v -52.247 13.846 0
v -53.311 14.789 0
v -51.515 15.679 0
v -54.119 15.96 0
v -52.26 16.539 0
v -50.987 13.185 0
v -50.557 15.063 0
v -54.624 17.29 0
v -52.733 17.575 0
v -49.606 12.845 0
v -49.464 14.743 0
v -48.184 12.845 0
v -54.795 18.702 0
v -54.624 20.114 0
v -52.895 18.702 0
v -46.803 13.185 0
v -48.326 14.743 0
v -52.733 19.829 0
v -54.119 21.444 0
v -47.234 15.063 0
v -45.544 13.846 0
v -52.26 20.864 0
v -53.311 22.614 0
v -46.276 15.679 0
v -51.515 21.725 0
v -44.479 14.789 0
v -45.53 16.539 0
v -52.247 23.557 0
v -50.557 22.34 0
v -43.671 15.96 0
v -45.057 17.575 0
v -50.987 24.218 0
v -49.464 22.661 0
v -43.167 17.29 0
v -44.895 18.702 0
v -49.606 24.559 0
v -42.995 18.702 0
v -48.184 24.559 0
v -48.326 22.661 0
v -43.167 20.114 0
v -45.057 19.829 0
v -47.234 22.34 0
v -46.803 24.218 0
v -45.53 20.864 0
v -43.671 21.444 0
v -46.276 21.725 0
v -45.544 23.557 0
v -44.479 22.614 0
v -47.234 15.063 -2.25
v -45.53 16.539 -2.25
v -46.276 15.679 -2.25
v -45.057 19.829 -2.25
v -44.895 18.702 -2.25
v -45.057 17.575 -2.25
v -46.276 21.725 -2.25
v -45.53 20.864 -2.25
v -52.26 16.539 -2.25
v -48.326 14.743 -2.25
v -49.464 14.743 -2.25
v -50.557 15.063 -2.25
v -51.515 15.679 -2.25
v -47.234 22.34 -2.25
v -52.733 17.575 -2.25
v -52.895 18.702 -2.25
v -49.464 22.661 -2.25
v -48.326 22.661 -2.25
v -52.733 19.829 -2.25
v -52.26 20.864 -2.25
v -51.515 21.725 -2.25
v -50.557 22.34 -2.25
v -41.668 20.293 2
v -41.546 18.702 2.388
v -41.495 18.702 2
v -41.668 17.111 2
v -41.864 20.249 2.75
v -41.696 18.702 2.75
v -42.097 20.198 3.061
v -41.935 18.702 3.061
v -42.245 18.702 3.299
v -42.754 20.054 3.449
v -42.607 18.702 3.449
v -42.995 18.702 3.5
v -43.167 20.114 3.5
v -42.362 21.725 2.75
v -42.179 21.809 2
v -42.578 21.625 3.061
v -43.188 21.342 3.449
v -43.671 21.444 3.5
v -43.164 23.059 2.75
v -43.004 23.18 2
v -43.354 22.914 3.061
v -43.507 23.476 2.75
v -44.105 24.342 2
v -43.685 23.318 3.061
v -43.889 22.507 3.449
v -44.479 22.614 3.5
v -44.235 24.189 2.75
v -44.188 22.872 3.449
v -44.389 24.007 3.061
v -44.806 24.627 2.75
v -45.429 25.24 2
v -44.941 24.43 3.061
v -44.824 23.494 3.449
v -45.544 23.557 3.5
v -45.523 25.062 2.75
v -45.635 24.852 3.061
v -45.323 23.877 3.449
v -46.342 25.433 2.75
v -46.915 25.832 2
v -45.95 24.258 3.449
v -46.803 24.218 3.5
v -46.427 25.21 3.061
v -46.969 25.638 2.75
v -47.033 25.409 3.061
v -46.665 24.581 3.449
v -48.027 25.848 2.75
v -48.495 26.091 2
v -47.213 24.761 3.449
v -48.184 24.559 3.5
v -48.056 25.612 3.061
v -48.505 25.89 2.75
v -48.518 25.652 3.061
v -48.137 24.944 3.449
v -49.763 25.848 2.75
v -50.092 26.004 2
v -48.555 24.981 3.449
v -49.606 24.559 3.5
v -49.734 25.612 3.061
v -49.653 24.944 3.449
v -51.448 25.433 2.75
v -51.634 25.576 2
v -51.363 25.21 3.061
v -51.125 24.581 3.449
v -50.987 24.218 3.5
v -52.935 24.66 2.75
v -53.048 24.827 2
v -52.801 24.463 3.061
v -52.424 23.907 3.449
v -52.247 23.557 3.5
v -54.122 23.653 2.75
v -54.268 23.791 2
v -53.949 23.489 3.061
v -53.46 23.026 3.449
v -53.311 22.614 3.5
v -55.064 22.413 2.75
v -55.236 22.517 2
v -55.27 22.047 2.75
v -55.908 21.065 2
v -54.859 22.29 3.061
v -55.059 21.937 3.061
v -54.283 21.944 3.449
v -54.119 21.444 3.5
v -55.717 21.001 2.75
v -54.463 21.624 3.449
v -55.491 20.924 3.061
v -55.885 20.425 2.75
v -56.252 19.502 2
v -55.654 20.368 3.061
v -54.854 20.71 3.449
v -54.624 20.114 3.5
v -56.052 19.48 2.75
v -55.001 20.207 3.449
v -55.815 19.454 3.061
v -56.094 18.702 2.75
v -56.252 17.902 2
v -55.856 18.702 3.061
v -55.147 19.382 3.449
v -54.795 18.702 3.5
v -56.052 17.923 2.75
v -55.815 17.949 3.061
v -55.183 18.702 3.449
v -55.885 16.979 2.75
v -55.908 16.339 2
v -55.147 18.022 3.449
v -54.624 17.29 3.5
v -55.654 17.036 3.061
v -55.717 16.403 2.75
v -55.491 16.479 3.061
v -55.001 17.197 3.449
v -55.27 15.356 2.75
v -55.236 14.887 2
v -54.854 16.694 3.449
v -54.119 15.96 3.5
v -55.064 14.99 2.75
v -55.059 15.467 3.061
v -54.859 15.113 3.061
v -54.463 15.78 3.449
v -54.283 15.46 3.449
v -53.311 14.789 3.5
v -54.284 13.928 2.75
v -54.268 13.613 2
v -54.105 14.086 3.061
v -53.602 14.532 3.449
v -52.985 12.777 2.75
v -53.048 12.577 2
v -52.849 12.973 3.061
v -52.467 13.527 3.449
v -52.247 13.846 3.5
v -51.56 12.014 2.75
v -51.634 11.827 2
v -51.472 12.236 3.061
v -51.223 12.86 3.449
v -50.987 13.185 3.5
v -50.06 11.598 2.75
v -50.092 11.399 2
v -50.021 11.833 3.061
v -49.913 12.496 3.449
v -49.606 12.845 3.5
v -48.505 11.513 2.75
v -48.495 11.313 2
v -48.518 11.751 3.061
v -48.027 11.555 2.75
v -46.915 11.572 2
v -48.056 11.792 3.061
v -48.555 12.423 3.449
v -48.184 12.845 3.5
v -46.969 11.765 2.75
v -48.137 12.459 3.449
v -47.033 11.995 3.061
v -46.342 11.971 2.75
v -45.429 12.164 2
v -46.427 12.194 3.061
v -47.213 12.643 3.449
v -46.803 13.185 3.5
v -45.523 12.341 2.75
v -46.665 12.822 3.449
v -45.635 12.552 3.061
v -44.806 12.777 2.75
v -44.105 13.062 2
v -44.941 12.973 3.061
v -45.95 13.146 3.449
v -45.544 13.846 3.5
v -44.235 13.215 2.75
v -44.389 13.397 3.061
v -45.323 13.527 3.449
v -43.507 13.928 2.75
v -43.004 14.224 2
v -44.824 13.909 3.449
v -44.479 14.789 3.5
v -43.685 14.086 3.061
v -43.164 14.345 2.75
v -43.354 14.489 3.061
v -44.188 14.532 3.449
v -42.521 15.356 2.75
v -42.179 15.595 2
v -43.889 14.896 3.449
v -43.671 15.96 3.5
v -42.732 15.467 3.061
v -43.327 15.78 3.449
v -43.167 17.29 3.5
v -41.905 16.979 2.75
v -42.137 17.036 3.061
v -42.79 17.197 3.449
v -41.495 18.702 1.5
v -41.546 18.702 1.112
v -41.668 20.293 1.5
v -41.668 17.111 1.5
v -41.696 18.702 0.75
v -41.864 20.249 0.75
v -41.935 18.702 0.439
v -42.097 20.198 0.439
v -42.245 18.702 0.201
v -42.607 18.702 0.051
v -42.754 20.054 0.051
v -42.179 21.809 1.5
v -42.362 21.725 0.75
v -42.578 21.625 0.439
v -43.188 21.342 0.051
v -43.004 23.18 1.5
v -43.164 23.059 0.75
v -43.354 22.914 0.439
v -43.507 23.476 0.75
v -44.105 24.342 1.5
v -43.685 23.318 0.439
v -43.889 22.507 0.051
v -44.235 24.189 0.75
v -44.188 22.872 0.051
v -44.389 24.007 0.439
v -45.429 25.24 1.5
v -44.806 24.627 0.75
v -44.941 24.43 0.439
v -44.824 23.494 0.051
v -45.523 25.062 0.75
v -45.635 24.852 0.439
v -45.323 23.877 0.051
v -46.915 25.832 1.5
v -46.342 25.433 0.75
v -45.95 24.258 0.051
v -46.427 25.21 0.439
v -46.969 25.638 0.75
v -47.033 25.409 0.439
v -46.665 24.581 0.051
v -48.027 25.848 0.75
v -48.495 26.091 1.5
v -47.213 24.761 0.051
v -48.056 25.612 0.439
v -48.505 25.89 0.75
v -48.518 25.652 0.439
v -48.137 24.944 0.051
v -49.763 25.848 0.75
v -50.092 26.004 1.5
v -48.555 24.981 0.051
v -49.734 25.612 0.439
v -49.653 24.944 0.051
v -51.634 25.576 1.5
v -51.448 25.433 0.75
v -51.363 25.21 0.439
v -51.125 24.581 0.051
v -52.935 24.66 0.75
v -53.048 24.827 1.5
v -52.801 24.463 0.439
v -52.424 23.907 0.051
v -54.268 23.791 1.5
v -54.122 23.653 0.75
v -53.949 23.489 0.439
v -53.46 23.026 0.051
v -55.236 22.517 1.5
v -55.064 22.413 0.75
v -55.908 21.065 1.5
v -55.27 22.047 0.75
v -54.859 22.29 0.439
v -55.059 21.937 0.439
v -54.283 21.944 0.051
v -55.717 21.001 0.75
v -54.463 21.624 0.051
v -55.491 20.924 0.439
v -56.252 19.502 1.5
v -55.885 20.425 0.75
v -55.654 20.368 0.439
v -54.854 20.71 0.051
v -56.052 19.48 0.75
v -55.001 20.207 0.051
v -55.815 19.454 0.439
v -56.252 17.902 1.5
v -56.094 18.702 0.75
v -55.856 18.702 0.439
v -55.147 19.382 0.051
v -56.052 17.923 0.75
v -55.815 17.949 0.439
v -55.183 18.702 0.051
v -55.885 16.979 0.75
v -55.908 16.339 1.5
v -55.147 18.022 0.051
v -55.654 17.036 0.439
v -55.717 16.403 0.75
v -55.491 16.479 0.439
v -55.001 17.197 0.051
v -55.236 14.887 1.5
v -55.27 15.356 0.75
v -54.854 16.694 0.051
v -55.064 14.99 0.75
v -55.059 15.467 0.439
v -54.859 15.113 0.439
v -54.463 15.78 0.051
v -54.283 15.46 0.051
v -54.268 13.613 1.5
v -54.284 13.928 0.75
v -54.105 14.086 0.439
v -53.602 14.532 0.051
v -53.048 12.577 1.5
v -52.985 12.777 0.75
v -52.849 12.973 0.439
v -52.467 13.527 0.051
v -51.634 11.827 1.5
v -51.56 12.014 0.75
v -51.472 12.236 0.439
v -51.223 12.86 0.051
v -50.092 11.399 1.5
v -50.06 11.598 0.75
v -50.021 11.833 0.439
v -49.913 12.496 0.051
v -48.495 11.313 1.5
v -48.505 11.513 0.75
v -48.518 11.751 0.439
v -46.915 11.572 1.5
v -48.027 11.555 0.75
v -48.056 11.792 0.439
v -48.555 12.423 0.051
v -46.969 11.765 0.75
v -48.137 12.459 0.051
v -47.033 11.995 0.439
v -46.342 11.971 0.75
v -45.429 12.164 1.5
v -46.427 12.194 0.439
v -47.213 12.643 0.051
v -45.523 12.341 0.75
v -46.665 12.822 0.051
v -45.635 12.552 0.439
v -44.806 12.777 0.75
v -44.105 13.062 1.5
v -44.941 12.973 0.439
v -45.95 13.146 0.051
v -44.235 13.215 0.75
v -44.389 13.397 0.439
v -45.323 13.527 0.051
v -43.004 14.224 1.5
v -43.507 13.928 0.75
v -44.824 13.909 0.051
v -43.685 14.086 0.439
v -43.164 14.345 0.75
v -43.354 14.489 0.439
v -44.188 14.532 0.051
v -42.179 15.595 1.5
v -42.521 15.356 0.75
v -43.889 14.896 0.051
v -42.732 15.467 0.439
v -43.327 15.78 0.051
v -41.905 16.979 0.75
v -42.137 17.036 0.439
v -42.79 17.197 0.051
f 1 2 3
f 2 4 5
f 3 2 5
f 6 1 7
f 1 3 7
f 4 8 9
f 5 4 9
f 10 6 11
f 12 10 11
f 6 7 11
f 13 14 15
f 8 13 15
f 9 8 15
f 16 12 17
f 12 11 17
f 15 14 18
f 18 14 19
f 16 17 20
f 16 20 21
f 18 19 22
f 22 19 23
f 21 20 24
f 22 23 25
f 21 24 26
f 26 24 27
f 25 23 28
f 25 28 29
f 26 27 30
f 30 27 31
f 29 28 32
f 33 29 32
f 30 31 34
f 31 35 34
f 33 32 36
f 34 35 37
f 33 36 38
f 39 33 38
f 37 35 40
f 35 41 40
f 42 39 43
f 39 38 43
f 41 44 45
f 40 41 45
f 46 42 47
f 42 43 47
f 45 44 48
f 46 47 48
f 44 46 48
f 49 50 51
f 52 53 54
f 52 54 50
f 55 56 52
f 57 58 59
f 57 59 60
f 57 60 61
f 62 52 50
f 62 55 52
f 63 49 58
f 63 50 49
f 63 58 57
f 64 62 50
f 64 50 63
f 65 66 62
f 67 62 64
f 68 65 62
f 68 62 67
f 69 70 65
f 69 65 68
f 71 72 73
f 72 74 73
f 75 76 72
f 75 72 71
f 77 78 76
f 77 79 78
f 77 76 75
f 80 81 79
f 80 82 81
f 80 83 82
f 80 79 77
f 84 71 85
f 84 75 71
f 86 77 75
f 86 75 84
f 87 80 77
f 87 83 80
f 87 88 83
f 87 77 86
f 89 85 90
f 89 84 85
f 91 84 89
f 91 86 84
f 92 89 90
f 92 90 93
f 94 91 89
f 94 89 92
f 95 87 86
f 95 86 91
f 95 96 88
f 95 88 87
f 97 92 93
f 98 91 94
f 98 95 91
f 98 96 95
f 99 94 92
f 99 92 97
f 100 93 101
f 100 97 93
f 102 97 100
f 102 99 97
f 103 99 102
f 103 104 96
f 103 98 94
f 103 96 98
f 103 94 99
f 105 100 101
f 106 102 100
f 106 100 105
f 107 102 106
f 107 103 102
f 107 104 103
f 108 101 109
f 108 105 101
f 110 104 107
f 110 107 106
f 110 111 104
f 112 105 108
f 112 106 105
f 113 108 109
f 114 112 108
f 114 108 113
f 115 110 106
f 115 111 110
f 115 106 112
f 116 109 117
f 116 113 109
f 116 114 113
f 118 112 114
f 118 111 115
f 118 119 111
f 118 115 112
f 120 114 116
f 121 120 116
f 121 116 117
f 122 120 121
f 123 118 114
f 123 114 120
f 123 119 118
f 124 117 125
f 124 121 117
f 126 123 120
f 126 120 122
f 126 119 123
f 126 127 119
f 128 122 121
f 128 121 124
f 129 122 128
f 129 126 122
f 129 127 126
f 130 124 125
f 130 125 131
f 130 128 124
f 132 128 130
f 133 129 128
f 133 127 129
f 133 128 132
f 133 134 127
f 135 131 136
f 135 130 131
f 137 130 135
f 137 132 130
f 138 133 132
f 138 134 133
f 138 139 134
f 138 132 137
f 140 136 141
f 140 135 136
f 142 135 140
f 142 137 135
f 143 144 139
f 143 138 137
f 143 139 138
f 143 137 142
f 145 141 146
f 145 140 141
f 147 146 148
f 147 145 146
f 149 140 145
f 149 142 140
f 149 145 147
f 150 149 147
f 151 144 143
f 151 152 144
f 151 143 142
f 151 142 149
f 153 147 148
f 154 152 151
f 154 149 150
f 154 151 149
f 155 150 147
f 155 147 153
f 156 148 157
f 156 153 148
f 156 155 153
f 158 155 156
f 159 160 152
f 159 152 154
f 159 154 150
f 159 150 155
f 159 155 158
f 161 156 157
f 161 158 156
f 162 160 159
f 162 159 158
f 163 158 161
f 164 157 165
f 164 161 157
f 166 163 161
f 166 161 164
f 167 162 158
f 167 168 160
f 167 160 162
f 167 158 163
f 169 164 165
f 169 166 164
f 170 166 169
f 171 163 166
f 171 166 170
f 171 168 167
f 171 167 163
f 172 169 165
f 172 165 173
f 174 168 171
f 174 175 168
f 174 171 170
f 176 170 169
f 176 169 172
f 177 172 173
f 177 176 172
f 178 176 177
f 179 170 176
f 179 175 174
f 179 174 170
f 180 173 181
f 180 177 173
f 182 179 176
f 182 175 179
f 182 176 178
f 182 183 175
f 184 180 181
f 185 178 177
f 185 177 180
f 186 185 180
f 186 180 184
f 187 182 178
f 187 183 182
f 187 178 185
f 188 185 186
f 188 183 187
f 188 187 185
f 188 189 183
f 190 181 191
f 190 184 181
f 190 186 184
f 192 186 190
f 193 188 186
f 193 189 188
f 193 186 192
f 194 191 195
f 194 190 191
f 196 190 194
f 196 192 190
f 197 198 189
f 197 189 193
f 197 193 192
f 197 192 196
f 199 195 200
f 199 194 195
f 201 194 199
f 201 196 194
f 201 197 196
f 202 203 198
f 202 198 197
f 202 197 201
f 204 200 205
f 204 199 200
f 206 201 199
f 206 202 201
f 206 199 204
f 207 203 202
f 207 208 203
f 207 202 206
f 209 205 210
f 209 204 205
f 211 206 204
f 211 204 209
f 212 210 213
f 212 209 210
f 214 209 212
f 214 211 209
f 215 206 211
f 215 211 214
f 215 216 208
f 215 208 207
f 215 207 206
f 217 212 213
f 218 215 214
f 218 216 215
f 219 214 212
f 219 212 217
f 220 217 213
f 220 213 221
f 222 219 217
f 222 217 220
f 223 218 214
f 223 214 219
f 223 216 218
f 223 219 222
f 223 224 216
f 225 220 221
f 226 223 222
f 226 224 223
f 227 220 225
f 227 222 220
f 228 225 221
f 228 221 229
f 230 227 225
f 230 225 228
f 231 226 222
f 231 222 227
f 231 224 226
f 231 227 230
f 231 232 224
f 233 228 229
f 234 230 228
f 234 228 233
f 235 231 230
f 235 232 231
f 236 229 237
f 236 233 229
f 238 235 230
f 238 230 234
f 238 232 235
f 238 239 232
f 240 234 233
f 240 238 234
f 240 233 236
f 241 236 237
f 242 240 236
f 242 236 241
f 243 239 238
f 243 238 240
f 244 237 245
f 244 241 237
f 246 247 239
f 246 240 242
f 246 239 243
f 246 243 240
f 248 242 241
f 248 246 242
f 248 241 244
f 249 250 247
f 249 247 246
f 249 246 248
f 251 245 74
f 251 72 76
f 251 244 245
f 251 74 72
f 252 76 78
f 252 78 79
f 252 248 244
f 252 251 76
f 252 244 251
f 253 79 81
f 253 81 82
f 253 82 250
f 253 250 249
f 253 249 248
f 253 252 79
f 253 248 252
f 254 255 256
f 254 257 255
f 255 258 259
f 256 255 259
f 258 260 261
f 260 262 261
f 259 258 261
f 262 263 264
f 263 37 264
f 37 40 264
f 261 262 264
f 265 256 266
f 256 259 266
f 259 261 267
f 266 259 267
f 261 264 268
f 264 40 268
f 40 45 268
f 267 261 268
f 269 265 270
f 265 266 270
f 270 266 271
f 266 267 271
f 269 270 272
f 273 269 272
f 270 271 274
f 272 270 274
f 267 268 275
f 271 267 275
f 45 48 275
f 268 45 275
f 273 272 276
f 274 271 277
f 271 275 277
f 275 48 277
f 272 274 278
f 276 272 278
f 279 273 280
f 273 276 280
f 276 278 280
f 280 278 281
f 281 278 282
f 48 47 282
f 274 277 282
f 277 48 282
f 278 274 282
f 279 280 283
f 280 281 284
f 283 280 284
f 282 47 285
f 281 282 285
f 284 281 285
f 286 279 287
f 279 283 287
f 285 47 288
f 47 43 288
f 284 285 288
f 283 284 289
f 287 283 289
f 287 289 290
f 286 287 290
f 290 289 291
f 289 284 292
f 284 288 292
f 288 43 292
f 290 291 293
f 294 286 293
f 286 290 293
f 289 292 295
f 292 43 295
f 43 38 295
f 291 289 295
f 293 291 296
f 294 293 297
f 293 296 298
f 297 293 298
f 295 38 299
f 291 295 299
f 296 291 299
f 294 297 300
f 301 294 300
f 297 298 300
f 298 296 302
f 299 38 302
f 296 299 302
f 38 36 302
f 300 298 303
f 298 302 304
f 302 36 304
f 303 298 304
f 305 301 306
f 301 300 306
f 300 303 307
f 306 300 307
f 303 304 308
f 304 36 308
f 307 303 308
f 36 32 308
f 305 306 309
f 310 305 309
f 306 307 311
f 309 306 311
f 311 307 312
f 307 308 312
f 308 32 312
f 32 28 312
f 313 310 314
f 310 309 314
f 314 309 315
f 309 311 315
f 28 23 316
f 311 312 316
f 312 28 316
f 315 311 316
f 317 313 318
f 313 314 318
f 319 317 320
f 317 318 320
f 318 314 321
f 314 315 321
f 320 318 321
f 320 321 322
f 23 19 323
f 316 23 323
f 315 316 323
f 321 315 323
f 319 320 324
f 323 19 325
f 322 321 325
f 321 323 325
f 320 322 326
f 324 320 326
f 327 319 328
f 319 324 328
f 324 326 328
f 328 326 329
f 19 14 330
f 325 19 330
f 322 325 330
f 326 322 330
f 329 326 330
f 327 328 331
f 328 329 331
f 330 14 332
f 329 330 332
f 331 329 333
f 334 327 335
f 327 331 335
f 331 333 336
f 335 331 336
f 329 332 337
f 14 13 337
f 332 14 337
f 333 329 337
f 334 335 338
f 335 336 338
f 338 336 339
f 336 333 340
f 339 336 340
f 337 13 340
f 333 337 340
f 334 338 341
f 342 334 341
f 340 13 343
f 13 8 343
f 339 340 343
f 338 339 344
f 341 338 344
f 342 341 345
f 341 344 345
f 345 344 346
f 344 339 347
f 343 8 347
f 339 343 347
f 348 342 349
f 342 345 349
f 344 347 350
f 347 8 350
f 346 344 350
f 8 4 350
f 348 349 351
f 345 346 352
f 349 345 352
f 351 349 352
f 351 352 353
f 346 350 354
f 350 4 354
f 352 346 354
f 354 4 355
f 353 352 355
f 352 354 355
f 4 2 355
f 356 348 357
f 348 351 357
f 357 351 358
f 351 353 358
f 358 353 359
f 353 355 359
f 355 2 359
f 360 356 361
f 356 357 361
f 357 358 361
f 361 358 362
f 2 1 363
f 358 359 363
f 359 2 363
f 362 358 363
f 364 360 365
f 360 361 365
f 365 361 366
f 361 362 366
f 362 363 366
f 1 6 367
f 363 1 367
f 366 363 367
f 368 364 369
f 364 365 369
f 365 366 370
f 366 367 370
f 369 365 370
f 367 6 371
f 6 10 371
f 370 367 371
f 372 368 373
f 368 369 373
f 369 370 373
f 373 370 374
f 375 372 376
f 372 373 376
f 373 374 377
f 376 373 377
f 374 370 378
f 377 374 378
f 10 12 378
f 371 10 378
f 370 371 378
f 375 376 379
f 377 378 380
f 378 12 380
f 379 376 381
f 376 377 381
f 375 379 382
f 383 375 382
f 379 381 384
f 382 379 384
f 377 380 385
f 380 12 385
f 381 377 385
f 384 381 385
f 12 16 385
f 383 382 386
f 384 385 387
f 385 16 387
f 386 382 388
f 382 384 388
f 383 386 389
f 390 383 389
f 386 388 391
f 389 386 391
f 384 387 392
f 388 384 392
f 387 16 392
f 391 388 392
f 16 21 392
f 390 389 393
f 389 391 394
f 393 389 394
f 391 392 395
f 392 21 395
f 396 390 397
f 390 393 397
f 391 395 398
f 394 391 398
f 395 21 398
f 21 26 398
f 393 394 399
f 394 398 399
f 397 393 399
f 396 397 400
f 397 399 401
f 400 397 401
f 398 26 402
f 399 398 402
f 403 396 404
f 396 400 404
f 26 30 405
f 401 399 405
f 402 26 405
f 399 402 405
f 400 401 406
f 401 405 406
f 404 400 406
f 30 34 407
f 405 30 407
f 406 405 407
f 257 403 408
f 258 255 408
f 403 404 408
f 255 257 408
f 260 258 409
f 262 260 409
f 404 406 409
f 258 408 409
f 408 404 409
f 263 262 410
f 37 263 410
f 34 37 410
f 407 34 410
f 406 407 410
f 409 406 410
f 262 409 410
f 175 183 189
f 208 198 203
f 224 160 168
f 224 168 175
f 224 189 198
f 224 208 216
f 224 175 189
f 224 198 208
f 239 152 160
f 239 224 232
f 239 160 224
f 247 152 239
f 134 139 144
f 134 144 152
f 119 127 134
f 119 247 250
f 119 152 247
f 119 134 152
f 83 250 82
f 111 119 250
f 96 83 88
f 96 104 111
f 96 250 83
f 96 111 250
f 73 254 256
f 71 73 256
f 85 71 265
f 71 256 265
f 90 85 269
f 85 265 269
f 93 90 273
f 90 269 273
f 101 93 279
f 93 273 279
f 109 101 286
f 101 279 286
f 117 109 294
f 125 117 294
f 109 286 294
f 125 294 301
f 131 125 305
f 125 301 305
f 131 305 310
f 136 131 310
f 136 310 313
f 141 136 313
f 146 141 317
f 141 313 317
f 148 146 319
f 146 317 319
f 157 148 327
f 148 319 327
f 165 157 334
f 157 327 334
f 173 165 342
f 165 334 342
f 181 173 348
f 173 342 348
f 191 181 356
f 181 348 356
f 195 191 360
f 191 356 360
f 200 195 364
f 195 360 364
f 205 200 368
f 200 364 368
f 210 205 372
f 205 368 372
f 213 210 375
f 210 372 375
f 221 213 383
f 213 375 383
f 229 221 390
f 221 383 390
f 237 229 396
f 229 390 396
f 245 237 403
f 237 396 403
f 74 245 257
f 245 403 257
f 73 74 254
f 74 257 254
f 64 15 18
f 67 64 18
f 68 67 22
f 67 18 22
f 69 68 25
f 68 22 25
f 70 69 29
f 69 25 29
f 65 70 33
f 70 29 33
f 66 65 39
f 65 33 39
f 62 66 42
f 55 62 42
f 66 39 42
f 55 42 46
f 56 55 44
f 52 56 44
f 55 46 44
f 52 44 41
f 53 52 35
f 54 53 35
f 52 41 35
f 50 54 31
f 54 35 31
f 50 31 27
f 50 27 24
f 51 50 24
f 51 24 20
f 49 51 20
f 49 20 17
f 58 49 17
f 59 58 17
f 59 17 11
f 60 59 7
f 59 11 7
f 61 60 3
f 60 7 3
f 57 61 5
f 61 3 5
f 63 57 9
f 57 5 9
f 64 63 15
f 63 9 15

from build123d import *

# Parameters (mm, degrees)
SKETCH1_R           = 7.4
BOSS_EXTRUDE1_DEPTH = 3.5
SKETCH2_R           = 4
BOSS_EXTRUDE2_DEPTH = 2.25
FILLET1_R           = 1.5
FILLET2_R           = 1.5


with BuildPart() as part:
    # Sketch1 → Boss-Extrude1 (new body)
    with BuildSketch(Plane.XY):
        with Locations((-48.895186784, 18.701845636)):
            Circle(SKETCH1_R)
    extrude(amount=BOSS_EXTRUDE1_DEPTH)

    # Sketch2 → Boss-Extrude2 (add)
    with BuildSketch(Plane(origin=(0, 0, 0), x_dir=(-1, 0, 0), z_dir=(0, 0, -1))):
        with Locations((48.895186784, 18.701845636)):
            Circle(SKETCH2_R)
    extrude(amount=BOSS_EXTRUDE2_DEPTH)

    # Fillet1
    fillet1_edges = [part.edges().sort_by_distance(p)[0] for p in [
        (-56.295186784, 18.701845636, 3.5),
    ]]
    fillet(fillet1_edges, radius=FILLET1_R)

    # Fillet2
    fillet2_edges = [part.edges().sort_by_distance(p)[0] for p in [
        (-56.295186784, 18.701845636, 0),
    ]]
    fillet(fillet2_edges, radius=FILLET2_R)


solid = part.part
